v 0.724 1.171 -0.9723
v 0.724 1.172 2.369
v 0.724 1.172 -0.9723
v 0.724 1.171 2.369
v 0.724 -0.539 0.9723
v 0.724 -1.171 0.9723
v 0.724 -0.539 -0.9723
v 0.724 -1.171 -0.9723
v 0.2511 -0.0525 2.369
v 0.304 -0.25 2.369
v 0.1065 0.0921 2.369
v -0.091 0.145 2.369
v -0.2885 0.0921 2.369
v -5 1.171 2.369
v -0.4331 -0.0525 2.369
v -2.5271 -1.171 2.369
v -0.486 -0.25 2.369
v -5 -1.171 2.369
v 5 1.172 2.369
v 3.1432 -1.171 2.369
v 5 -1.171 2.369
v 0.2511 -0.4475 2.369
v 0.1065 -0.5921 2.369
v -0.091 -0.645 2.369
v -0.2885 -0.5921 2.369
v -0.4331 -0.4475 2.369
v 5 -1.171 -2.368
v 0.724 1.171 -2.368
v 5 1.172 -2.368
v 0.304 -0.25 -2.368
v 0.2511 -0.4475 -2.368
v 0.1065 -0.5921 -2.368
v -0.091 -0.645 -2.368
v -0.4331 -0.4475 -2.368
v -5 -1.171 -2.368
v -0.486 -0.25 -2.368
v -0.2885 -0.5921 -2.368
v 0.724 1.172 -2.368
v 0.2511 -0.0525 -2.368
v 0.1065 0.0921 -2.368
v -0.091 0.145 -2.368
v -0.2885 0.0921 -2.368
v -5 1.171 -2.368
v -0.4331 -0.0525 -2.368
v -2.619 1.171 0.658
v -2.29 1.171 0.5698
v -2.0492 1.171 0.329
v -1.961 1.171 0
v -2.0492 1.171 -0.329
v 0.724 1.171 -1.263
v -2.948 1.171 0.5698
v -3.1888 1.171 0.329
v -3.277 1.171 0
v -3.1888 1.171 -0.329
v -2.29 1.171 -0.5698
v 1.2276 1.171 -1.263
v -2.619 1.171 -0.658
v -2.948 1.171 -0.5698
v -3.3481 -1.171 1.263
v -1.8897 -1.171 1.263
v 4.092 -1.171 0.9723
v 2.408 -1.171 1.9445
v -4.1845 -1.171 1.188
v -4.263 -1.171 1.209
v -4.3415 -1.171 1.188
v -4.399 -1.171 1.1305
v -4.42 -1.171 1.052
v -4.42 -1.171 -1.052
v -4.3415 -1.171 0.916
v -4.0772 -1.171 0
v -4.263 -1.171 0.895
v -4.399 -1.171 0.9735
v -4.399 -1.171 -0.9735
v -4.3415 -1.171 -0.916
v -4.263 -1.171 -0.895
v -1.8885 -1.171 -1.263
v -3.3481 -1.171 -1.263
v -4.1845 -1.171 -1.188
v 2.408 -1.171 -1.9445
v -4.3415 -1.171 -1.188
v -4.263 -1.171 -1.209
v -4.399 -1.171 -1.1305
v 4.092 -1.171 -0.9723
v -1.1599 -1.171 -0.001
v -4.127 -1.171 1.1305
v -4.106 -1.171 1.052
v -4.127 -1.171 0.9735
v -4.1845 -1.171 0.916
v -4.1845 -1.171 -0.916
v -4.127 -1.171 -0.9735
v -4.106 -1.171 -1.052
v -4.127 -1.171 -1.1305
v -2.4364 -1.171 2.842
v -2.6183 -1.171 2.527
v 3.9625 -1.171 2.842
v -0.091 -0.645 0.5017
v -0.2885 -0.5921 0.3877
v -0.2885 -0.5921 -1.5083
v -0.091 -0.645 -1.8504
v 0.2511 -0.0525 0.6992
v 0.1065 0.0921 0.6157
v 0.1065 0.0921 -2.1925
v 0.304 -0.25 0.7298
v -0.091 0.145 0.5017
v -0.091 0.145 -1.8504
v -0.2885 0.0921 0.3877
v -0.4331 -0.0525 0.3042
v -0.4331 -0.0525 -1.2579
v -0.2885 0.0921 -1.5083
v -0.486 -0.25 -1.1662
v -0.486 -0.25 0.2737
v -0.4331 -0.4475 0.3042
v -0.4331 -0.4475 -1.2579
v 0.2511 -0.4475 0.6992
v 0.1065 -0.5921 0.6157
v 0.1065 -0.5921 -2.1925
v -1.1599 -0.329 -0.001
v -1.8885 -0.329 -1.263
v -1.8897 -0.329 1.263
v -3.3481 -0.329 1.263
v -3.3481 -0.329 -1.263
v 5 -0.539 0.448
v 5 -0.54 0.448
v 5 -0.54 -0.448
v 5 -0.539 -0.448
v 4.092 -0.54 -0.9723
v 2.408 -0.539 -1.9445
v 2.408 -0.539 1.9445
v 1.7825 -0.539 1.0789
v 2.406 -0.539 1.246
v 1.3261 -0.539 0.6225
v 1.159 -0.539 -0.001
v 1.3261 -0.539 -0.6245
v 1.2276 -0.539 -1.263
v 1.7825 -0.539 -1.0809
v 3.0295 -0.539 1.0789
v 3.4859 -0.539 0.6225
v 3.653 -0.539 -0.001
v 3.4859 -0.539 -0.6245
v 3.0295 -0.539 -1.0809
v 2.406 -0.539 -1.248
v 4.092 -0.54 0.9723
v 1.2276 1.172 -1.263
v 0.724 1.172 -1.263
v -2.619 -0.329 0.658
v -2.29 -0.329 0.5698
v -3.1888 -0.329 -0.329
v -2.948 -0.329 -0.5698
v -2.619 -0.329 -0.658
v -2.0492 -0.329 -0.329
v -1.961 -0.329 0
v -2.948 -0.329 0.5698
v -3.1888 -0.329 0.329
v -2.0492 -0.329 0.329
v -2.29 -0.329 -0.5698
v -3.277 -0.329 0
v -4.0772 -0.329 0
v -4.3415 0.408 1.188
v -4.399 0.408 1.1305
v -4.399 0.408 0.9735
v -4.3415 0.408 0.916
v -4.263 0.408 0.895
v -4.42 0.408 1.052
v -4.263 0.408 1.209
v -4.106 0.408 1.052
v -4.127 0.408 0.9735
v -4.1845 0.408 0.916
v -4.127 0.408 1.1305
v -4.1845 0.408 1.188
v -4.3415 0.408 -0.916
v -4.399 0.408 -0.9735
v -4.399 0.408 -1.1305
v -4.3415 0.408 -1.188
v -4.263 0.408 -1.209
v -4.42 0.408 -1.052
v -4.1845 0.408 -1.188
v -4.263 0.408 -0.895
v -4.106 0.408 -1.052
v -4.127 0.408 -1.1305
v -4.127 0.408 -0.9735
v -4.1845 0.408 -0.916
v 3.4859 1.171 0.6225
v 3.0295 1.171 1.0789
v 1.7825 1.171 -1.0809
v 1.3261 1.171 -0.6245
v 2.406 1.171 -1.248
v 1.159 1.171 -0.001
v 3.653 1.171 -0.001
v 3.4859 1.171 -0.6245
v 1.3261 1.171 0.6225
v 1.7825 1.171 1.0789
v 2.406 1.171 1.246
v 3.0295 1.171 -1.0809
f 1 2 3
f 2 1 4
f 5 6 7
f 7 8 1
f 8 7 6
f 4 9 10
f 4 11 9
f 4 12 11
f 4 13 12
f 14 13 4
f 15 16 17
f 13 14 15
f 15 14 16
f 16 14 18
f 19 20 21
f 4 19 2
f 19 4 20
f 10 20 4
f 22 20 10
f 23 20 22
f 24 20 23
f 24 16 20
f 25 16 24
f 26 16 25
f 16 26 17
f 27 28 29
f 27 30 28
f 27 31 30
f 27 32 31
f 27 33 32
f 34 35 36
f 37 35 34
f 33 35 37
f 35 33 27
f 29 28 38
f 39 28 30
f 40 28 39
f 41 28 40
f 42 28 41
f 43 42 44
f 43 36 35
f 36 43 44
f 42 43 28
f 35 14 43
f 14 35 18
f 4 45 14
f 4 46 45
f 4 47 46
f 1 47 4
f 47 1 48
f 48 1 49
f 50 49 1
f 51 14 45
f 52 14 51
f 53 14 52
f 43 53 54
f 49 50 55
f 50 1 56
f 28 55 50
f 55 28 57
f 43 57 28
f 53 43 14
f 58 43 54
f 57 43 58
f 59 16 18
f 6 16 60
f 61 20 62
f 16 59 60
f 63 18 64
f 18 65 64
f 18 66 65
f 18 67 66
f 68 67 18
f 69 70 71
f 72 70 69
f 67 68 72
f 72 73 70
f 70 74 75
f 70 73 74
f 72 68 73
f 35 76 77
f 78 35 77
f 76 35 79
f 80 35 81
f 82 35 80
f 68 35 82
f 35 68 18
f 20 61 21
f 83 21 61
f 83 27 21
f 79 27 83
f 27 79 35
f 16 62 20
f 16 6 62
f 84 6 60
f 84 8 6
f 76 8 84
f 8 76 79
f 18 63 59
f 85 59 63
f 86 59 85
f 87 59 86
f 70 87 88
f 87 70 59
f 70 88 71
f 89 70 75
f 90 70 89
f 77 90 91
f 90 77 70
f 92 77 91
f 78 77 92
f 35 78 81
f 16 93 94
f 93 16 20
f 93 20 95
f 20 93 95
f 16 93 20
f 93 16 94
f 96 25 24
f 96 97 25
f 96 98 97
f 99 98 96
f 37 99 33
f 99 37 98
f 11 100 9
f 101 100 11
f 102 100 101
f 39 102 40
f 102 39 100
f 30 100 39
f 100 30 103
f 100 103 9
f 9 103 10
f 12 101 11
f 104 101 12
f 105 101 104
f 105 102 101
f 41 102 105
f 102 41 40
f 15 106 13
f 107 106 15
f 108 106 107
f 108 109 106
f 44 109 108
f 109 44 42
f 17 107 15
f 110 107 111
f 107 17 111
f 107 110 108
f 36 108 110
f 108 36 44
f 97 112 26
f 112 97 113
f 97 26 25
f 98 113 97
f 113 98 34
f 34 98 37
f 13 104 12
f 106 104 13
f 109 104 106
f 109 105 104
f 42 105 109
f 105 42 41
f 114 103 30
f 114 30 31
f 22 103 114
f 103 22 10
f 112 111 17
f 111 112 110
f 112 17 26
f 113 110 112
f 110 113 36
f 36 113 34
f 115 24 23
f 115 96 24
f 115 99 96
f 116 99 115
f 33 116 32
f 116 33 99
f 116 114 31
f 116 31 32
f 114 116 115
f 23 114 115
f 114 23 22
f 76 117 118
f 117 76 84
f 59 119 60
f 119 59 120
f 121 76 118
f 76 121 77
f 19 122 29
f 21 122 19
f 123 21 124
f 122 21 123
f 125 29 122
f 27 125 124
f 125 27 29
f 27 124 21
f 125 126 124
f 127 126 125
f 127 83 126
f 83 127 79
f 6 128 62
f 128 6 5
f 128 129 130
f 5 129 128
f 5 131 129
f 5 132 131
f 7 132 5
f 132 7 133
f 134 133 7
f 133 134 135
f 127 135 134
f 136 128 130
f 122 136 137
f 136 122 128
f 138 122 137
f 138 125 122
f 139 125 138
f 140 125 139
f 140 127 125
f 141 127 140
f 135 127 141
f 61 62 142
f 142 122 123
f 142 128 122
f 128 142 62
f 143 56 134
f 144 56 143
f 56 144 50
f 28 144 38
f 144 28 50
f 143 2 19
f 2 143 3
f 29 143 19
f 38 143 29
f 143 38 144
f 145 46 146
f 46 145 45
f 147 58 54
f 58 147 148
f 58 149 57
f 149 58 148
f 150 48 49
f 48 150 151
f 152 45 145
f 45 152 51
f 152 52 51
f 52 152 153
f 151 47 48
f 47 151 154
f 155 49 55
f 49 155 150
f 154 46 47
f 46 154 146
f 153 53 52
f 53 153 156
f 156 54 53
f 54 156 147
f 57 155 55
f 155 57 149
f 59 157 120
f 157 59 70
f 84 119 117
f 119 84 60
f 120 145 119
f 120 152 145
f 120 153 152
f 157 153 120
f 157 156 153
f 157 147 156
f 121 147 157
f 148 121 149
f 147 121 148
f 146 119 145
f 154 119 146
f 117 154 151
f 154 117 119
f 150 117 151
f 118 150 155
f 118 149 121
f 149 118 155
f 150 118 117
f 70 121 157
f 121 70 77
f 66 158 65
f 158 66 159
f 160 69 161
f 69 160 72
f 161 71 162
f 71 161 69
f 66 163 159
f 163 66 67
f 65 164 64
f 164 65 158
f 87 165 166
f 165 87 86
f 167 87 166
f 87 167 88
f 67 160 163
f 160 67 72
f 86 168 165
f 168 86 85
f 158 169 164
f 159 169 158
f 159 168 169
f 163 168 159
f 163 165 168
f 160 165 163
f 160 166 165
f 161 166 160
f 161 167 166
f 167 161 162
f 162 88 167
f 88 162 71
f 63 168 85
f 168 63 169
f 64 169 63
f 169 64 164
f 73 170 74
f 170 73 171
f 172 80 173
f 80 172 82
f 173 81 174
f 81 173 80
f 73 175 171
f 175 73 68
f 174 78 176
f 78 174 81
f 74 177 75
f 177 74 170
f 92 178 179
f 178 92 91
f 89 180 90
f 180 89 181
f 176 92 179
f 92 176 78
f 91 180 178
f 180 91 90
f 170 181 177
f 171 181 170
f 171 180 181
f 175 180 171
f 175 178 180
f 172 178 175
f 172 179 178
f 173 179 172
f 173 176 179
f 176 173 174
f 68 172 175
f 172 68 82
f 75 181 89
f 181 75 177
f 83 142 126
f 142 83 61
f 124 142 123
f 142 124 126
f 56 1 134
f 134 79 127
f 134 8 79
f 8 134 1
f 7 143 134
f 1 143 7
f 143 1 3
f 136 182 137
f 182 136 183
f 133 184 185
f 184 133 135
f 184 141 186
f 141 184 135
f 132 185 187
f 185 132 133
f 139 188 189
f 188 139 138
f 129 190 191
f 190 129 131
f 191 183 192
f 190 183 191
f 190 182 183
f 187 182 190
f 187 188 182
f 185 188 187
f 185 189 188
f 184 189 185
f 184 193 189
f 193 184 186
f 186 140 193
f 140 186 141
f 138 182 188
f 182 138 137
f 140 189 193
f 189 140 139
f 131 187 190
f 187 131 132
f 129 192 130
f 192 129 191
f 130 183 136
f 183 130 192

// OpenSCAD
intersection() {
translate([-6, -1.405, -2.842]) cube(size = [12, 2.811, 5.684], center = false);
union() {
difference() {
difference() {
rotate([-90, -30, 0])
translate([-1.004, -0.48, -1.171]) cube(size = [19.104, 3.368, 2.342], center = false);
translate([-5, -1.171, -18.1]) cube(size = [23.1, 0.842, 36.2], center = false);
}
union() {
translate([-0.091, -0.25, -2.368])
cylinder(h = 20.468, r1 = 0.395, r2 = 0.395, center = false, $fn = 12);
rotate([90, 30, 0])
translate([-1.004, -18.1, -1.171]) cube(size = [19.104, 36.2, 1.5], center = false);
}
}
difference() {
difference() {
translate([-5, -1.171, -2.368]) cube(size = [5.724, 2.342, 4.737], center = false);
translate([-0.091, -0.25, -2.368])
cylinder(h = 4.737, r1 = 0.395, r2 = 0.395, center = false, $fn = 12);
}
intersection() {
rotate([90, 30, 0])
translate([-18.1, -18.1, -1.171]) cube(size = [17.096, 36.2, 2.342], center = false);
translate([-18.1, -1.171, -1.263]) cube(size = [18.824, 2.342, 2.526], center = false);
}
}
difference() {
union() {
difference() {
translate([-5, -1.171, -2.368]) cube(size = [10, 2.342, 4.737], center = false);
rotate([-90, -30, 0])
translate([-1.004, -0.48, -18.1]) cube(size = [19.104, 3.368, 19.271], center = false);
}
intersection() {
rotate([90, 30, 0])
translate([-1.004, 2.888, 0.539]) cube(size = [19.104, 15.212, 0.632], center = false);
translate([0.724, -1.171, -1.263]) cube(size = [4.276, 0.632, 3.632], center = false);
}
translate([0.724, -0.539, -2.368]) cube(size = [4.276, 1.711, 1.105], center = false);
}
union() {
rotate([180, 90, -90])
translate([-1.052, 4.263, -18.1])
cylinder(h = 18.508, r1 = 0.157, r2 = 0.157, center = false, $fn = 12);
intersection() {
translate([-5, -1.171, -18.1]) cube(size = [5.724, 2.342, 19.363], center = false);
rotate([180, 90, -90])
translate([0, 2.619, -18.1])
cylinder(h = 19.271, r1 = 0.658, r2 = 0.658, center = false, $fn = 12);
}
rotate([180, 90, -90])
translate([1.052, 4.263, -18.1])
cylinder(h = 18.508, r1 = 0.157, r2 = 0.157, center = false, $fn = 12);
intersection() {
union() {
translate([0.724, -1.171, -2.368]) cube(size = [4.276, 0.632, 4.737], center = false);
rotate([90, 30, 0])
translate([-3.531, -18.1, -18.1]) cube(size = [21.631, 36.2, 19.271], center = false);
}
union() {
translate([-0.091, -0.25, -18.1])
cylinder(h = 36.2, r1 = 0.395, r2 = 0.395, center = false, $fn = 12);
rotate([-90, -30, 0])
translate([-3.531, -18.1, -1.171]) cube(size = [2.526, 20.988, 0.842], center = false);
}
}
}
}
intersection() {
union() {
translate([0.724, -1.171, -2.368]) cube(size = [4.276, 2.342, 3.632], center = false);
rotate([-90, -30, 0])
translate([-18.1, -18.1, -1.171]) cube(size = [17.096, 17.62, 1.579], center = false);
}
union() {
translate([4.092, -18.1, -1.263]) cube(size = [0.908, 17.56, 19.363], center = false);
rotate([90, 30, 0])
translate([-1.004, -18.1, -1.171]) cube(size = [19.104, 17.62, 2.342], center = false);
}
}
intersection() {
difference() {
rotate([90, 30, 0])
translate([-3.531, -0.48, -18.1]) cube(size = [21.631, 18.58, 19.271], center = false);
rotate([180, 90, -90])
translate([0.001, -2.406, -1.171])
cylinder(h = 2.342, r1 = 1.247, r2 = 1.247, center = false, $fn = 12);
}
union() {
translate([0.724, -0.539, -2.368]) cube(size = [4.276, 1.711, 4.737], center = false);
rotate([-90, -30, 0])
translate([-1.004, -18.1, -18.1]) cube(size = [19.104, 17.62, 16.929], center = false);
}
}
}
}
